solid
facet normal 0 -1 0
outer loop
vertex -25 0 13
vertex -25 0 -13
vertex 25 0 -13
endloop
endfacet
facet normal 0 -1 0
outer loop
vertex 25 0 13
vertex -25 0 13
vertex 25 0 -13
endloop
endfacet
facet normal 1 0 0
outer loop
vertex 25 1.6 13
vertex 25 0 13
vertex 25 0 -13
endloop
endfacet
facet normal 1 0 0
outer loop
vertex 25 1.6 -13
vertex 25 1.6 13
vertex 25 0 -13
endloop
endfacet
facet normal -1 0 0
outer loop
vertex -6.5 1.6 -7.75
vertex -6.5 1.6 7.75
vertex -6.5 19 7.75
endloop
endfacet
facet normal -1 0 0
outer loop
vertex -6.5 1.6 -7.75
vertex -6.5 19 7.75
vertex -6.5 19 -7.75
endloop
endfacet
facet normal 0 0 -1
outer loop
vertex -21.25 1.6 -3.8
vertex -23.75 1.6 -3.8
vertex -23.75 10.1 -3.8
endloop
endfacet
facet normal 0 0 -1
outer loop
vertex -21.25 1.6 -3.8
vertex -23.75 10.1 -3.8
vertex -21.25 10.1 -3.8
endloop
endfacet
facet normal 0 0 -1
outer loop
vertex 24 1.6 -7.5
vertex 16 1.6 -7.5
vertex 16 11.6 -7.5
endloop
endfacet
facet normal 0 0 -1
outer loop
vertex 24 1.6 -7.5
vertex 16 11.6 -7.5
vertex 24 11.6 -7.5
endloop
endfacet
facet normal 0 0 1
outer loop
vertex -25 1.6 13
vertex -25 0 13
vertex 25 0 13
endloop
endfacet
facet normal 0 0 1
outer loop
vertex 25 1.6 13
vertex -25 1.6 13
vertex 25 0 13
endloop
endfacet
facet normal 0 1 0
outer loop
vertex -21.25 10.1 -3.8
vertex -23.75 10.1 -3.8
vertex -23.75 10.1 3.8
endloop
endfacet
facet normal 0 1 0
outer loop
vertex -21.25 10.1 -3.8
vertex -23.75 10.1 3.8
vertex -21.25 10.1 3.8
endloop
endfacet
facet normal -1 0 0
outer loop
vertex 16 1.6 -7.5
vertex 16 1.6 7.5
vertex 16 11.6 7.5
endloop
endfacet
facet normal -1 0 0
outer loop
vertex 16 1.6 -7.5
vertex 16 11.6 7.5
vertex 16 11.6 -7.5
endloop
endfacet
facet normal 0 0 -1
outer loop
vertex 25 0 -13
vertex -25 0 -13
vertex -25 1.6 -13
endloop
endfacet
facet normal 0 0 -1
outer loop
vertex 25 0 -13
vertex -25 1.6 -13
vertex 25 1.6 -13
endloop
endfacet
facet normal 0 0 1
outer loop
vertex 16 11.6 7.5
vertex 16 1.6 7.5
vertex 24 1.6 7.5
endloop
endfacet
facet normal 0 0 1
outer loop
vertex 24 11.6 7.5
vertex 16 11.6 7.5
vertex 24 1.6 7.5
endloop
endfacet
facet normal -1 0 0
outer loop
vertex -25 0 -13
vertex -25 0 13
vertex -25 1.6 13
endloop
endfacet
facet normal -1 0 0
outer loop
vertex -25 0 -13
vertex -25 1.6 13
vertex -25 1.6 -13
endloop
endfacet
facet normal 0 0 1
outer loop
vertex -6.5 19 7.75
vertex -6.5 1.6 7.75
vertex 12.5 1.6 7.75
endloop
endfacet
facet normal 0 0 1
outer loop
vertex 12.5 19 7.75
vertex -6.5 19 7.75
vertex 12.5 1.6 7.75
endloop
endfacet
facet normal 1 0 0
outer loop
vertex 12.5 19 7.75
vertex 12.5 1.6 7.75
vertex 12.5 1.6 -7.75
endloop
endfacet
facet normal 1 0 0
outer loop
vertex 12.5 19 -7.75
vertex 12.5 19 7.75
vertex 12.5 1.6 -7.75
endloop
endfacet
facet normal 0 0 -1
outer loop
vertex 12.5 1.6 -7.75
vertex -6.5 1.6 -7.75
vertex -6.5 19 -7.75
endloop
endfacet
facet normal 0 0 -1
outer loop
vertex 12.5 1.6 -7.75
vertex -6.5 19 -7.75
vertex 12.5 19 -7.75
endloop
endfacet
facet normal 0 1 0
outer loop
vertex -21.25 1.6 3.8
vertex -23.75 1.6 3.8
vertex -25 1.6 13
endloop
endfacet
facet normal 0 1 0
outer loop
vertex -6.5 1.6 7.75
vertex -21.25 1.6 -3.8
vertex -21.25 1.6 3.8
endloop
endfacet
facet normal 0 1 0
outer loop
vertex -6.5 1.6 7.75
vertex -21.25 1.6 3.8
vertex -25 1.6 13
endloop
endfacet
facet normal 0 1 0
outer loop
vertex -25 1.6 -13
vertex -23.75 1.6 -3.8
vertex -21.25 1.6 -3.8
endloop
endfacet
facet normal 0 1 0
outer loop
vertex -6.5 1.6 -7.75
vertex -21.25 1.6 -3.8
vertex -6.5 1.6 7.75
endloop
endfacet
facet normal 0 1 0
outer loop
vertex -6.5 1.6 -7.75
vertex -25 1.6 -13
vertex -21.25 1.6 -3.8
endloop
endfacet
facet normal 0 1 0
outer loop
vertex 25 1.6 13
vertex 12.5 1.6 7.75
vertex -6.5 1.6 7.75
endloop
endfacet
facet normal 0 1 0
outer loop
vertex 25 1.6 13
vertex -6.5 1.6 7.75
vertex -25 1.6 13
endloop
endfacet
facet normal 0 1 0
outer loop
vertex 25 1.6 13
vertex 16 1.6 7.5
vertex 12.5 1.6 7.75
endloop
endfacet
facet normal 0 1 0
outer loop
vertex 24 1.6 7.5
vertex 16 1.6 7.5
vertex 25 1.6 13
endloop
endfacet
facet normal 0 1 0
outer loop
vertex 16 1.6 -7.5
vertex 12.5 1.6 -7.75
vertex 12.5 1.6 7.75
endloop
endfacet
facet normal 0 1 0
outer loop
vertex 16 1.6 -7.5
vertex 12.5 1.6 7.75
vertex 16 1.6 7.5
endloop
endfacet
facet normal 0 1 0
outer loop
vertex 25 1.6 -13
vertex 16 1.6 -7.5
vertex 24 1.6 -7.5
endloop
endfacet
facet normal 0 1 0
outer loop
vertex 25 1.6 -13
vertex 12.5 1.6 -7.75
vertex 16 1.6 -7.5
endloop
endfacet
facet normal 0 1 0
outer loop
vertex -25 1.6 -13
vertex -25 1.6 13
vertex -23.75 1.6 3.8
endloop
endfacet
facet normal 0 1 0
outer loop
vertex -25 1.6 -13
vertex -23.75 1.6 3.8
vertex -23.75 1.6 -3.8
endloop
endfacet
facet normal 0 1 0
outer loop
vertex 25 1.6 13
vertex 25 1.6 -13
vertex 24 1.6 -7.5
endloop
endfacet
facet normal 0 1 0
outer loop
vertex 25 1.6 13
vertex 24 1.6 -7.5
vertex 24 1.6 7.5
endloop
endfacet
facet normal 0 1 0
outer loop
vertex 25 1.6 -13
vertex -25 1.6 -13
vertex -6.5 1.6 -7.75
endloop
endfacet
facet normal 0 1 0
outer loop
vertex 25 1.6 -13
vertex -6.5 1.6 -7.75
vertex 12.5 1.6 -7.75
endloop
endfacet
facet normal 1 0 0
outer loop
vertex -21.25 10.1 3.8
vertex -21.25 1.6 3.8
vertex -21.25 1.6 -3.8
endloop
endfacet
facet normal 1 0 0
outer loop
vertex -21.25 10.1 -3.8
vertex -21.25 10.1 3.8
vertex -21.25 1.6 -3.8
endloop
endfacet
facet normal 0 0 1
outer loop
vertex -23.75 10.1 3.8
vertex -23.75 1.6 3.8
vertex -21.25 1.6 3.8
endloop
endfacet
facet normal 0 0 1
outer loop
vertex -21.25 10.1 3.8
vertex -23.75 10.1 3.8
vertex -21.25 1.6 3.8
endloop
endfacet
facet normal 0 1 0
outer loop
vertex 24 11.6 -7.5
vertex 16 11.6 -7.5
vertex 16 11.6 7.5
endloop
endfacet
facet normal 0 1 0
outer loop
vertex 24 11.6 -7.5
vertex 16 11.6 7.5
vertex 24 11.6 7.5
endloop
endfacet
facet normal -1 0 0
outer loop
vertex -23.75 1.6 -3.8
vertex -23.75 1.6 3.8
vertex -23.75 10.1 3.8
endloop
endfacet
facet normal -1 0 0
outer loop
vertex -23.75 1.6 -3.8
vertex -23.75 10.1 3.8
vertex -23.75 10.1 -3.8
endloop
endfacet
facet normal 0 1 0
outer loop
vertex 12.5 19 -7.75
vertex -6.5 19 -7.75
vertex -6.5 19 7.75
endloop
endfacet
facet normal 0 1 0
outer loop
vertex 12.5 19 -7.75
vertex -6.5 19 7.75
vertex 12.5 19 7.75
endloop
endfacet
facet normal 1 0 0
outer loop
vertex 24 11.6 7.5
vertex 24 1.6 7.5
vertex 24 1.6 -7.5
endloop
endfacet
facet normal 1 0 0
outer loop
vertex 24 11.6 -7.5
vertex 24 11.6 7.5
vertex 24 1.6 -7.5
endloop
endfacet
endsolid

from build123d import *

# Parameters (mm, degrees)
SKETCH1_W            = 50
SKETCH1_H            = 26
BOARD_DEPTH          = 1.6
RELAY_START          = 1.6
SKETCH2_W            = 19
SKETCH2_H            = 15.5
RELAY_DEPTH          = 17.4
TERMINAL_BLOCK_START = 1.6
SKETCH3_W            = 8
SKETCH3_H            = 15
TERMINAL_BLOCK_DEPTH = 10
HEADER_START         = 1.6
SKETCH4_W            = 2.5
SKETCH4_H            = 7.6
HEADER_DEPTH         = 8.5


with BuildPart() as part:
    # Sketch1 → Board (new body)
    with BuildSketch(Plane(origin=(0, 0, 0), x_dir=(1, 0, 0), z_dir=(0, 1, 0))):
        Rectangle(SKETCH1_W, SKETCH1_H)
    extrude(amount=BOARD_DEPTH)

    # Sketch2 → Relay (add)
    with BuildSketch(Plane(origin=(0, 0, 0), x_dir=(1, 0, 0), z_dir=(0, 1, 0)).offset(RELAY_START)):
        with Locations((3, 0)):
            Rectangle(SKETCH2_W, SKETCH2_H)
    extrude(amount=RELAY_DEPTH)

    # Sketch3 → Terminal_Block (add)
    with BuildSketch(Plane(origin=(0, 0, 0), x_dir=(1, 0, 0), z_dir=(0, 1, 0)).offset(TERMINAL_BLOCK_START)):
        with Locations((20, 0)):
            Rectangle(SKETCH3_W, SKETCH3_H)
    extrude(amount=TERMINAL_BLOCK_DEPTH)

    # Sketch4 → Header (add)
    with BuildSketch(Plane(origin=(0, 0, 0), x_dir=(1, 0, 0), z_dir=(0, 1, 0)).offset(HEADER_START)):
        with Locations((-22.5, 0)):
            Rectangle(SKETCH4_W, SKETCH4_H)
    extrude(amount=HEADER_DEPTH)


solid = part.part
